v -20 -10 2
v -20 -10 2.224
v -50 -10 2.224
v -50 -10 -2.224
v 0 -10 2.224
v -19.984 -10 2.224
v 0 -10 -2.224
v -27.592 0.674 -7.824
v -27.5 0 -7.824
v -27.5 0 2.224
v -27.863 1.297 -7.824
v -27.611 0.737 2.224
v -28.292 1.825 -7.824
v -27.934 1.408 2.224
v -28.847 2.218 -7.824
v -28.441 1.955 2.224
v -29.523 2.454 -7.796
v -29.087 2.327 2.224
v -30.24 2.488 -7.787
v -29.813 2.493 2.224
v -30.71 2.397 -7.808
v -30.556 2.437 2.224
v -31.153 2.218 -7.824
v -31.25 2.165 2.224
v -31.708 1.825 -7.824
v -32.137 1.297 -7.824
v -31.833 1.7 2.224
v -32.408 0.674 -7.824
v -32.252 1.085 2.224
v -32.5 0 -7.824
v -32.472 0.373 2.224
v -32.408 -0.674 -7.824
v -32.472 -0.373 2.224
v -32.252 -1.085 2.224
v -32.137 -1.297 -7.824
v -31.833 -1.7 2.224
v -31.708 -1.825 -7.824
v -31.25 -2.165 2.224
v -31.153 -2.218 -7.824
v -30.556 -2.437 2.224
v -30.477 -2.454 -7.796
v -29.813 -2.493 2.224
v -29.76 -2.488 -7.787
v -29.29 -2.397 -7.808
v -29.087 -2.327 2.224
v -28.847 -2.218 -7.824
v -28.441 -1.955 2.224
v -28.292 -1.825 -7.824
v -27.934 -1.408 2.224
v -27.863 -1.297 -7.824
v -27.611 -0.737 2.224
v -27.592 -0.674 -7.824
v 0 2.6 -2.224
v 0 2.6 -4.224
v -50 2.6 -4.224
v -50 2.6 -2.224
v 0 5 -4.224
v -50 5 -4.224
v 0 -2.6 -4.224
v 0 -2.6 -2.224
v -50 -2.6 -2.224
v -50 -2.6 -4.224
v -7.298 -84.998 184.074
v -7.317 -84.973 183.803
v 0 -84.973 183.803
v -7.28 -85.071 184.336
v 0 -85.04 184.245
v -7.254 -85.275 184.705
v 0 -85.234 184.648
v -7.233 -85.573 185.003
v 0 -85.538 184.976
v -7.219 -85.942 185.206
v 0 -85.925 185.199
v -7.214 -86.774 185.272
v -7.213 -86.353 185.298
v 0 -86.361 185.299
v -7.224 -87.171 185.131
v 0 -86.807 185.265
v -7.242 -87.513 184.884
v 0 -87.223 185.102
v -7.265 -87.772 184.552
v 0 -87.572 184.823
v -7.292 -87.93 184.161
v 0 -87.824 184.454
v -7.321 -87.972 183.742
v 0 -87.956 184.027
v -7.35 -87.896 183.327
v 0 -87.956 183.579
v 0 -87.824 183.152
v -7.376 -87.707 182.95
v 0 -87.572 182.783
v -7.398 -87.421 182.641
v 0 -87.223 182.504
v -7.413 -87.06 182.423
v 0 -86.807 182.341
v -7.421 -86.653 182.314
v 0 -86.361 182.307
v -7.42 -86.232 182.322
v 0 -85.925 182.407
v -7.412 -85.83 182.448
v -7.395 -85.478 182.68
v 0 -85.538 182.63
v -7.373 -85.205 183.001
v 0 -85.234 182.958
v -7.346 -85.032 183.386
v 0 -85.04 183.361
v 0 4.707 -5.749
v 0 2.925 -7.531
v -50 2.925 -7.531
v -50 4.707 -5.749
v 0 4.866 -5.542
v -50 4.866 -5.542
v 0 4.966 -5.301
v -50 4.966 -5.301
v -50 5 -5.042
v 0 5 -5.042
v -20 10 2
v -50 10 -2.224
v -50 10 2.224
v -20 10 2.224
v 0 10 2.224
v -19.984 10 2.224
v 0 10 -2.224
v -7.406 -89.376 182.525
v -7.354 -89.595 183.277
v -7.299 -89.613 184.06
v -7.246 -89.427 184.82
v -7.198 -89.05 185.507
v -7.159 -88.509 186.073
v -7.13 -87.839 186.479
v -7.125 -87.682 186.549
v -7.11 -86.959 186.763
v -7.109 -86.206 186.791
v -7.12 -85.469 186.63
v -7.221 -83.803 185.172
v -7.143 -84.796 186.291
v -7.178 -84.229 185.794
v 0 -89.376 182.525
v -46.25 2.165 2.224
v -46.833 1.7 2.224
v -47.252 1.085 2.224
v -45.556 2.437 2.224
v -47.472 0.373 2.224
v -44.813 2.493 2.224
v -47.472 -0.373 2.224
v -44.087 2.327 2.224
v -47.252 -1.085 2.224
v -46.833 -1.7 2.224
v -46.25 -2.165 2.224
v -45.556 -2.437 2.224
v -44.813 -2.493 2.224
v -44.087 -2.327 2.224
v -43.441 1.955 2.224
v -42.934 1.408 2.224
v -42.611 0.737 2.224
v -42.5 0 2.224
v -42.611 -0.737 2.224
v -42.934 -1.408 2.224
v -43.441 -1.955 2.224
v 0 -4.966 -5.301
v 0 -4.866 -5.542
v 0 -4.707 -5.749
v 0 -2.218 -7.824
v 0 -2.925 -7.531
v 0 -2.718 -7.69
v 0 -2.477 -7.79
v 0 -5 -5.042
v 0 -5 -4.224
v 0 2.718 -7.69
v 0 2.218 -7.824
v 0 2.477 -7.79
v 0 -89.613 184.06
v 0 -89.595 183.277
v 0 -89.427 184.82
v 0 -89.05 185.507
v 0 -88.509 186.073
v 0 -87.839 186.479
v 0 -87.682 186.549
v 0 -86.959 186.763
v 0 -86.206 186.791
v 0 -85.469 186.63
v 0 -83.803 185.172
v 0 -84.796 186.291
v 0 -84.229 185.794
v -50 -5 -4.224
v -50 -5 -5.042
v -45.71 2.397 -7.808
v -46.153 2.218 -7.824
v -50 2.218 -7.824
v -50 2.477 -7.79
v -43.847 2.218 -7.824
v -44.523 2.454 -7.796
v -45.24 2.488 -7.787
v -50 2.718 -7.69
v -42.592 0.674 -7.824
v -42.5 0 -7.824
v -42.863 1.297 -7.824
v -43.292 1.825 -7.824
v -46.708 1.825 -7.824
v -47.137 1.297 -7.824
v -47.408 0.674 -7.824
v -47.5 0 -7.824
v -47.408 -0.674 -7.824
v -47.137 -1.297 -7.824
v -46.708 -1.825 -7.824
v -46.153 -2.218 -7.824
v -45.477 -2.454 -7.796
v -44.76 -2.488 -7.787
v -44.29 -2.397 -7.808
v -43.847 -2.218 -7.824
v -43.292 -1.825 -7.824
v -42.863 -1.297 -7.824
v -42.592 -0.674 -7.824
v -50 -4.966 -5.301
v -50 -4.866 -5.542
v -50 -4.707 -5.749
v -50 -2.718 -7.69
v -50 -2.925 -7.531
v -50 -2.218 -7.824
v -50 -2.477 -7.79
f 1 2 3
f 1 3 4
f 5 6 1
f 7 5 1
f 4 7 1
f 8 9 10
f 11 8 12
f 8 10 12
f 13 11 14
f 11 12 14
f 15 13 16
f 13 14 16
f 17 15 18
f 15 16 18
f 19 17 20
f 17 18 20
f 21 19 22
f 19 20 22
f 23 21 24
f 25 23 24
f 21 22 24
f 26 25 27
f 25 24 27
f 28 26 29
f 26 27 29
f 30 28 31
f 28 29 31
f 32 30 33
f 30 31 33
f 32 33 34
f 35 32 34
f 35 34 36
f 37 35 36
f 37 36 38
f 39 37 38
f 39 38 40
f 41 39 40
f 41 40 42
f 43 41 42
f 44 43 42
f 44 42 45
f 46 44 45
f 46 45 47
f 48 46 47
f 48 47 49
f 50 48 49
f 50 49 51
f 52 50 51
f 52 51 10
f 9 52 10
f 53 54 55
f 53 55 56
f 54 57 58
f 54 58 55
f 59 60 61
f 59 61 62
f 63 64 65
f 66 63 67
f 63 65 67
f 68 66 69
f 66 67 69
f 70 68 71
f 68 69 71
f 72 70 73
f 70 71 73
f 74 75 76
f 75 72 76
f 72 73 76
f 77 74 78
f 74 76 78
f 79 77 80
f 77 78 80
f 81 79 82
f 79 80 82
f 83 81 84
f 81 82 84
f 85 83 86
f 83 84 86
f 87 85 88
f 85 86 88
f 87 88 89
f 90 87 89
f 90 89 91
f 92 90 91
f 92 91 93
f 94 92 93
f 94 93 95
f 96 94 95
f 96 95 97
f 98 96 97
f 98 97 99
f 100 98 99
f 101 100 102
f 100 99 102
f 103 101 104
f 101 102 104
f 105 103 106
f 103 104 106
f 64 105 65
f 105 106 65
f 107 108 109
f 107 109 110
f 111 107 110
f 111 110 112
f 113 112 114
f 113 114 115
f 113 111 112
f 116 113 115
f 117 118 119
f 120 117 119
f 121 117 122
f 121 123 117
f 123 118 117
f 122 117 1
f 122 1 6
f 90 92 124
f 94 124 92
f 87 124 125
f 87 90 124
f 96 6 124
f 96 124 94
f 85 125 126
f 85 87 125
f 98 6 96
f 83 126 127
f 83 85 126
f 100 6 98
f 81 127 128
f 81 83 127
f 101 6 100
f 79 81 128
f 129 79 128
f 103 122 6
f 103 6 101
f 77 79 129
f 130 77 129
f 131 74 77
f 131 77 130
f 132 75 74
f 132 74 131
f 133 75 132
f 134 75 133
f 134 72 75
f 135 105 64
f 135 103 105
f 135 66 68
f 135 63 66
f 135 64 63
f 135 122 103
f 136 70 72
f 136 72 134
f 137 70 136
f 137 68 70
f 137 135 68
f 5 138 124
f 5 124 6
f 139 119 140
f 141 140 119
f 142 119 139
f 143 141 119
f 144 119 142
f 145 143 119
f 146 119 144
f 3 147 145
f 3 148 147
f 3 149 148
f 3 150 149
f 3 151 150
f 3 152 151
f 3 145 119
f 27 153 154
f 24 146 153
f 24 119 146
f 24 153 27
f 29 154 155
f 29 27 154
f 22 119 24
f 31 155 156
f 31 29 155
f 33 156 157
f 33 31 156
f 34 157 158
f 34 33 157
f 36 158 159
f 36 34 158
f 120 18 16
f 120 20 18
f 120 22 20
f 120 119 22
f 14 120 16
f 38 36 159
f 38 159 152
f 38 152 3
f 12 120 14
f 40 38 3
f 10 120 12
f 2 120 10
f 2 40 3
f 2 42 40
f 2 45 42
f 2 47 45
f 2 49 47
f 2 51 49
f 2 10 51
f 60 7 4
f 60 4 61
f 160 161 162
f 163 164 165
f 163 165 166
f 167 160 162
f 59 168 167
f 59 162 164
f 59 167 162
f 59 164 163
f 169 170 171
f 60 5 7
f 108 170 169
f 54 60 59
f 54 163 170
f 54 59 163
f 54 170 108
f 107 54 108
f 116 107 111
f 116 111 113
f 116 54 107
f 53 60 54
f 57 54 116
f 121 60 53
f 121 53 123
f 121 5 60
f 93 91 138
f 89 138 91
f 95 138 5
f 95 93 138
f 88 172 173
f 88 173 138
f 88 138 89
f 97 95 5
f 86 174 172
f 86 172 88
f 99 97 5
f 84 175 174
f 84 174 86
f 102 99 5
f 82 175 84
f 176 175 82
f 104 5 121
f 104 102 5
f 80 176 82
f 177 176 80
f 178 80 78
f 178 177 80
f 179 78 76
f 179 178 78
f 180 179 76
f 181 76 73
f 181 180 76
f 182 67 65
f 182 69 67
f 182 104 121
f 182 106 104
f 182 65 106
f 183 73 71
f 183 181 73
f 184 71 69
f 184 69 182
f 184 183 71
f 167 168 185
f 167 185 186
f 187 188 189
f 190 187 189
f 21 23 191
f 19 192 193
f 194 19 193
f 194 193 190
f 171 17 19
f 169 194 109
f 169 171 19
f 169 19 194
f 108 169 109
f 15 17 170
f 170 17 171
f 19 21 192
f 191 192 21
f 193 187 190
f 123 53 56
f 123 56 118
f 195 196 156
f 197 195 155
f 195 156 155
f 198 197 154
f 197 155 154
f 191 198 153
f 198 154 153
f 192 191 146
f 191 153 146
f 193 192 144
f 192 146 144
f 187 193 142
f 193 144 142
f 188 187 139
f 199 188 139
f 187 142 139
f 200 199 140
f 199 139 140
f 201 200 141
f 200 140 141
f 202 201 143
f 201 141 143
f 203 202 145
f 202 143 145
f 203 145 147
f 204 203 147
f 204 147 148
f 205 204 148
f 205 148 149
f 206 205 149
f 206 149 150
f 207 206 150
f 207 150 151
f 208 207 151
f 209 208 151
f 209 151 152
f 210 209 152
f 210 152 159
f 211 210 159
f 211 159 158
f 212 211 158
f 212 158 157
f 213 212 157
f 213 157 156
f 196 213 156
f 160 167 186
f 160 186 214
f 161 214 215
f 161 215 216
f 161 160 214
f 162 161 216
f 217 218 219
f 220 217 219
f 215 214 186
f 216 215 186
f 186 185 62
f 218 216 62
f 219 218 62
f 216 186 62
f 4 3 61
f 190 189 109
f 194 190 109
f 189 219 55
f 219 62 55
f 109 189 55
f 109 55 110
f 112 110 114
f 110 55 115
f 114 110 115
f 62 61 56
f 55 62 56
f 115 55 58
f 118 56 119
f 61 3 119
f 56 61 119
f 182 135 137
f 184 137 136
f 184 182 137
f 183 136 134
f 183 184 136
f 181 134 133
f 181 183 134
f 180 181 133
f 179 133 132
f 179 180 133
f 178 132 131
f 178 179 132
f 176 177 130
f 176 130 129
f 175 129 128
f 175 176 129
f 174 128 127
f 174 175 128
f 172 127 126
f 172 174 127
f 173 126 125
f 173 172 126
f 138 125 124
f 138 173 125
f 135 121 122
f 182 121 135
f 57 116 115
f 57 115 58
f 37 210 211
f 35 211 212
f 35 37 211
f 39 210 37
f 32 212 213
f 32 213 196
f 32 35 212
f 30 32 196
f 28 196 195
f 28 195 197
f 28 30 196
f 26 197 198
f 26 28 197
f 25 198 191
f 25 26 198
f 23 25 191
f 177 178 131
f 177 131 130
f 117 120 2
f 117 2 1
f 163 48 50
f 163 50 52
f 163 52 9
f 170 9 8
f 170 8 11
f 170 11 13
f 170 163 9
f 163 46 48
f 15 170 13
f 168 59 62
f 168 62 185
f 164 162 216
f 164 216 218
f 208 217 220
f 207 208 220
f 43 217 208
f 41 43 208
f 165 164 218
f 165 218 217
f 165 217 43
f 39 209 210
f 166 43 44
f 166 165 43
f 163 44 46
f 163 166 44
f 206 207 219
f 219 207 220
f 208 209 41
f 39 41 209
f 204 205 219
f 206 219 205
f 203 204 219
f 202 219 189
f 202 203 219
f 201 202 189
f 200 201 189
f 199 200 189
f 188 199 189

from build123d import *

# Parameters (mm, degrees)
F1_DEPTH = 50
F2_DEPTH = 20
F5_DEPTH = 99.6315023101
F6_R     = 1.5
F7_DEPTH = 7.4226145035
F8_R     = 2.5
F9_DEPTH = 10.0478655756


with BuildPart() as f1:
    # F0 (on Right) → F1 (new body)
    with BuildSketch(Plane.YZ):
        with BuildLine():
            Line((10, -2.2239327878), (10, 2.2239327878))
            Line((10, 2.2239327878), (-10, 2.2239327878))
            Line((-10, 2.2239327878), (-10, -2.2239327878))
            Line((-10, -2.2239327878), (-2.6, -2.2239327878))
            Line((-2.6, -2.2239327878), (-2.6, -4.2239327878))
            Line((-2.6, -4.2239327878), (-5, -4.2239327878))
            Line((-5, -4.2239327878), (-5, -5.0419522724))
            ThreePointArc((-5, -5.0419522724), (-4.9238795325, -5.4246357048), (-4.7071067812, -5.7490590536))
            Line((-4.7071067812, -5.7490590536), (-2.9251262658, -7.531039569))
            ThreePointArc((-2.9251262658, -7.531039569), (-2.600702917, -7.7478123203), (-2.2180194847, -7.8239327878))
            Line((-2.2180194847, -7.8239327878), (2.2180194847, -7.8239327878))
            ThreePointArc((2.2180194847, -7.8239327878), (2.600702917, -7.7478123203), (2.9251262658, -7.531039569))
            Line((2.9251262658, -7.531039569), (4.7071067812, -5.7490590536))
            ThreePointArc((4.7071067812, -5.7490590536), (4.9238795325, -5.4246357048), (5, -5.0419522724))
            Line((5, -5.0419522724), (5, -4.2239327878))
            Line((5, -4.2239327878), (2.6, -4.2239327878))
            Line((2.6, -4.2239327878), (2.6, -2.2239327878))
            Line((2.6, -2.2239327878), (10, -2.2239327878))
        make_face()
    extrude(amount=-F1_DEPTH)

    # F0 (on Right) → F2 (join)
    with BuildSketch(Plane.YZ):
        with BuildLine():
            Line((10, -2.2239327878), (10, 2.2239327878))
            Line((10, 2.2239327878), (-10, 2.2239327878))
            Line((-10, 2.2239327878), (-10, -2.2239327878))
            Line((-10, -2.2239327878), (-2.6, -2.2239327878))
            Line((-2.6, -2.2239327878), (-2.6, -4.2239327878))
            Line((-2.6, -4.2239327878), (-5, -4.2239327878))
            Line((-5, -4.2239327878), (-5, -5.0419522724))
            ThreePointArc((-5, -5.0419522724), (-4.9238795325, -5.4246357048), (-4.7071067812, -5.7490590536))
            Line((-4.7071067812, -5.7490590536), (-2.9251262658, -7.531039569))
            ThreePointArc((-2.9251262658, -7.531039569), (-2.600702917, -7.7478123203), (-2.2180194847, -7.8239327878))
            Line((-2.2180194847, -7.8239327878), (2.2180194847, -7.8239327878))
            ThreePointArc((2.2180194847, -7.8239327878), (2.600702917, -7.7478123203), (2.9251262658, -7.531039569))
            Line((2.9251262658, -7.531039569), (4.7071067812, -5.7490590536))
            ThreePointArc((4.7071067812, -5.7490590536), (4.9238795325, -5.4246357048), (5, -5.0419522724))
            Line((5, -5.0419522724), (5, -4.2239327878))
            Line((5, -4.2239327878), (2.6, -4.2239327878))
            Line((2.6, -4.2239327878), (2.6, -2.2239327878))
            Line((2.6, -2.2239327878), (10, -2.2239327878))
        make_face()
        with BuildLine():
            Line((-10, 2.2239327878), (10, 2.2239327878))
            Line((10, 2.2239327878), (-83.8033707131, 185.1717589215))
            ThreePointArc((-83.8033707131, 185.1717589215), (-85.4691993199, 186.6301037549), (-87.6816926961, 186.5486933108))
            Line((-87.6816926961, 186.5486933108), (-87.8392769518, 186.4793179564))
            ThreePointArc((-87.8392769518, 186.4793179564), (-89.4267375498, 184.8203885461), (-89.376201468, 182.5248441568))
            Line((-89.376201468, 182.5248441568), (-10, 2.2239327878))
        make_face()
    extrude(amount=-F2_DEPTH)

    # F4 (on offset) → F5 (cut, through all)
    with BuildSketch(Plane.XZ.offset(-10)):
        Polygon((-20, 203.6575904285), (-20, 2), (-6, 202.6809155941), align=None)
    extrude(amount=F5_DEPTH, mode=Mode.SUBTRACT)

    # F6 (on face) → F7 (cut, through all)
    with BuildSketch(Plane.YZ):
        with Locations((-86.4729180545, 183.8029941528)):
            Circle(F6_R)
    extrude(amount=-F7_DEPTH, mode=Mode.SUBTRACT)

    # F8 (on face) → F9 (cut, through all)
    with BuildSketch(Plane.XY.offset(2.2239327878)):
        with Locations((-45, 0)):
            Circle(F8_R)
        with Locations((-30, 0)):
            Circle(F8_R)
    extrude(amount=-F9_DEPTH, mode=Mode.SUBTRACT)


solid = f1.part
